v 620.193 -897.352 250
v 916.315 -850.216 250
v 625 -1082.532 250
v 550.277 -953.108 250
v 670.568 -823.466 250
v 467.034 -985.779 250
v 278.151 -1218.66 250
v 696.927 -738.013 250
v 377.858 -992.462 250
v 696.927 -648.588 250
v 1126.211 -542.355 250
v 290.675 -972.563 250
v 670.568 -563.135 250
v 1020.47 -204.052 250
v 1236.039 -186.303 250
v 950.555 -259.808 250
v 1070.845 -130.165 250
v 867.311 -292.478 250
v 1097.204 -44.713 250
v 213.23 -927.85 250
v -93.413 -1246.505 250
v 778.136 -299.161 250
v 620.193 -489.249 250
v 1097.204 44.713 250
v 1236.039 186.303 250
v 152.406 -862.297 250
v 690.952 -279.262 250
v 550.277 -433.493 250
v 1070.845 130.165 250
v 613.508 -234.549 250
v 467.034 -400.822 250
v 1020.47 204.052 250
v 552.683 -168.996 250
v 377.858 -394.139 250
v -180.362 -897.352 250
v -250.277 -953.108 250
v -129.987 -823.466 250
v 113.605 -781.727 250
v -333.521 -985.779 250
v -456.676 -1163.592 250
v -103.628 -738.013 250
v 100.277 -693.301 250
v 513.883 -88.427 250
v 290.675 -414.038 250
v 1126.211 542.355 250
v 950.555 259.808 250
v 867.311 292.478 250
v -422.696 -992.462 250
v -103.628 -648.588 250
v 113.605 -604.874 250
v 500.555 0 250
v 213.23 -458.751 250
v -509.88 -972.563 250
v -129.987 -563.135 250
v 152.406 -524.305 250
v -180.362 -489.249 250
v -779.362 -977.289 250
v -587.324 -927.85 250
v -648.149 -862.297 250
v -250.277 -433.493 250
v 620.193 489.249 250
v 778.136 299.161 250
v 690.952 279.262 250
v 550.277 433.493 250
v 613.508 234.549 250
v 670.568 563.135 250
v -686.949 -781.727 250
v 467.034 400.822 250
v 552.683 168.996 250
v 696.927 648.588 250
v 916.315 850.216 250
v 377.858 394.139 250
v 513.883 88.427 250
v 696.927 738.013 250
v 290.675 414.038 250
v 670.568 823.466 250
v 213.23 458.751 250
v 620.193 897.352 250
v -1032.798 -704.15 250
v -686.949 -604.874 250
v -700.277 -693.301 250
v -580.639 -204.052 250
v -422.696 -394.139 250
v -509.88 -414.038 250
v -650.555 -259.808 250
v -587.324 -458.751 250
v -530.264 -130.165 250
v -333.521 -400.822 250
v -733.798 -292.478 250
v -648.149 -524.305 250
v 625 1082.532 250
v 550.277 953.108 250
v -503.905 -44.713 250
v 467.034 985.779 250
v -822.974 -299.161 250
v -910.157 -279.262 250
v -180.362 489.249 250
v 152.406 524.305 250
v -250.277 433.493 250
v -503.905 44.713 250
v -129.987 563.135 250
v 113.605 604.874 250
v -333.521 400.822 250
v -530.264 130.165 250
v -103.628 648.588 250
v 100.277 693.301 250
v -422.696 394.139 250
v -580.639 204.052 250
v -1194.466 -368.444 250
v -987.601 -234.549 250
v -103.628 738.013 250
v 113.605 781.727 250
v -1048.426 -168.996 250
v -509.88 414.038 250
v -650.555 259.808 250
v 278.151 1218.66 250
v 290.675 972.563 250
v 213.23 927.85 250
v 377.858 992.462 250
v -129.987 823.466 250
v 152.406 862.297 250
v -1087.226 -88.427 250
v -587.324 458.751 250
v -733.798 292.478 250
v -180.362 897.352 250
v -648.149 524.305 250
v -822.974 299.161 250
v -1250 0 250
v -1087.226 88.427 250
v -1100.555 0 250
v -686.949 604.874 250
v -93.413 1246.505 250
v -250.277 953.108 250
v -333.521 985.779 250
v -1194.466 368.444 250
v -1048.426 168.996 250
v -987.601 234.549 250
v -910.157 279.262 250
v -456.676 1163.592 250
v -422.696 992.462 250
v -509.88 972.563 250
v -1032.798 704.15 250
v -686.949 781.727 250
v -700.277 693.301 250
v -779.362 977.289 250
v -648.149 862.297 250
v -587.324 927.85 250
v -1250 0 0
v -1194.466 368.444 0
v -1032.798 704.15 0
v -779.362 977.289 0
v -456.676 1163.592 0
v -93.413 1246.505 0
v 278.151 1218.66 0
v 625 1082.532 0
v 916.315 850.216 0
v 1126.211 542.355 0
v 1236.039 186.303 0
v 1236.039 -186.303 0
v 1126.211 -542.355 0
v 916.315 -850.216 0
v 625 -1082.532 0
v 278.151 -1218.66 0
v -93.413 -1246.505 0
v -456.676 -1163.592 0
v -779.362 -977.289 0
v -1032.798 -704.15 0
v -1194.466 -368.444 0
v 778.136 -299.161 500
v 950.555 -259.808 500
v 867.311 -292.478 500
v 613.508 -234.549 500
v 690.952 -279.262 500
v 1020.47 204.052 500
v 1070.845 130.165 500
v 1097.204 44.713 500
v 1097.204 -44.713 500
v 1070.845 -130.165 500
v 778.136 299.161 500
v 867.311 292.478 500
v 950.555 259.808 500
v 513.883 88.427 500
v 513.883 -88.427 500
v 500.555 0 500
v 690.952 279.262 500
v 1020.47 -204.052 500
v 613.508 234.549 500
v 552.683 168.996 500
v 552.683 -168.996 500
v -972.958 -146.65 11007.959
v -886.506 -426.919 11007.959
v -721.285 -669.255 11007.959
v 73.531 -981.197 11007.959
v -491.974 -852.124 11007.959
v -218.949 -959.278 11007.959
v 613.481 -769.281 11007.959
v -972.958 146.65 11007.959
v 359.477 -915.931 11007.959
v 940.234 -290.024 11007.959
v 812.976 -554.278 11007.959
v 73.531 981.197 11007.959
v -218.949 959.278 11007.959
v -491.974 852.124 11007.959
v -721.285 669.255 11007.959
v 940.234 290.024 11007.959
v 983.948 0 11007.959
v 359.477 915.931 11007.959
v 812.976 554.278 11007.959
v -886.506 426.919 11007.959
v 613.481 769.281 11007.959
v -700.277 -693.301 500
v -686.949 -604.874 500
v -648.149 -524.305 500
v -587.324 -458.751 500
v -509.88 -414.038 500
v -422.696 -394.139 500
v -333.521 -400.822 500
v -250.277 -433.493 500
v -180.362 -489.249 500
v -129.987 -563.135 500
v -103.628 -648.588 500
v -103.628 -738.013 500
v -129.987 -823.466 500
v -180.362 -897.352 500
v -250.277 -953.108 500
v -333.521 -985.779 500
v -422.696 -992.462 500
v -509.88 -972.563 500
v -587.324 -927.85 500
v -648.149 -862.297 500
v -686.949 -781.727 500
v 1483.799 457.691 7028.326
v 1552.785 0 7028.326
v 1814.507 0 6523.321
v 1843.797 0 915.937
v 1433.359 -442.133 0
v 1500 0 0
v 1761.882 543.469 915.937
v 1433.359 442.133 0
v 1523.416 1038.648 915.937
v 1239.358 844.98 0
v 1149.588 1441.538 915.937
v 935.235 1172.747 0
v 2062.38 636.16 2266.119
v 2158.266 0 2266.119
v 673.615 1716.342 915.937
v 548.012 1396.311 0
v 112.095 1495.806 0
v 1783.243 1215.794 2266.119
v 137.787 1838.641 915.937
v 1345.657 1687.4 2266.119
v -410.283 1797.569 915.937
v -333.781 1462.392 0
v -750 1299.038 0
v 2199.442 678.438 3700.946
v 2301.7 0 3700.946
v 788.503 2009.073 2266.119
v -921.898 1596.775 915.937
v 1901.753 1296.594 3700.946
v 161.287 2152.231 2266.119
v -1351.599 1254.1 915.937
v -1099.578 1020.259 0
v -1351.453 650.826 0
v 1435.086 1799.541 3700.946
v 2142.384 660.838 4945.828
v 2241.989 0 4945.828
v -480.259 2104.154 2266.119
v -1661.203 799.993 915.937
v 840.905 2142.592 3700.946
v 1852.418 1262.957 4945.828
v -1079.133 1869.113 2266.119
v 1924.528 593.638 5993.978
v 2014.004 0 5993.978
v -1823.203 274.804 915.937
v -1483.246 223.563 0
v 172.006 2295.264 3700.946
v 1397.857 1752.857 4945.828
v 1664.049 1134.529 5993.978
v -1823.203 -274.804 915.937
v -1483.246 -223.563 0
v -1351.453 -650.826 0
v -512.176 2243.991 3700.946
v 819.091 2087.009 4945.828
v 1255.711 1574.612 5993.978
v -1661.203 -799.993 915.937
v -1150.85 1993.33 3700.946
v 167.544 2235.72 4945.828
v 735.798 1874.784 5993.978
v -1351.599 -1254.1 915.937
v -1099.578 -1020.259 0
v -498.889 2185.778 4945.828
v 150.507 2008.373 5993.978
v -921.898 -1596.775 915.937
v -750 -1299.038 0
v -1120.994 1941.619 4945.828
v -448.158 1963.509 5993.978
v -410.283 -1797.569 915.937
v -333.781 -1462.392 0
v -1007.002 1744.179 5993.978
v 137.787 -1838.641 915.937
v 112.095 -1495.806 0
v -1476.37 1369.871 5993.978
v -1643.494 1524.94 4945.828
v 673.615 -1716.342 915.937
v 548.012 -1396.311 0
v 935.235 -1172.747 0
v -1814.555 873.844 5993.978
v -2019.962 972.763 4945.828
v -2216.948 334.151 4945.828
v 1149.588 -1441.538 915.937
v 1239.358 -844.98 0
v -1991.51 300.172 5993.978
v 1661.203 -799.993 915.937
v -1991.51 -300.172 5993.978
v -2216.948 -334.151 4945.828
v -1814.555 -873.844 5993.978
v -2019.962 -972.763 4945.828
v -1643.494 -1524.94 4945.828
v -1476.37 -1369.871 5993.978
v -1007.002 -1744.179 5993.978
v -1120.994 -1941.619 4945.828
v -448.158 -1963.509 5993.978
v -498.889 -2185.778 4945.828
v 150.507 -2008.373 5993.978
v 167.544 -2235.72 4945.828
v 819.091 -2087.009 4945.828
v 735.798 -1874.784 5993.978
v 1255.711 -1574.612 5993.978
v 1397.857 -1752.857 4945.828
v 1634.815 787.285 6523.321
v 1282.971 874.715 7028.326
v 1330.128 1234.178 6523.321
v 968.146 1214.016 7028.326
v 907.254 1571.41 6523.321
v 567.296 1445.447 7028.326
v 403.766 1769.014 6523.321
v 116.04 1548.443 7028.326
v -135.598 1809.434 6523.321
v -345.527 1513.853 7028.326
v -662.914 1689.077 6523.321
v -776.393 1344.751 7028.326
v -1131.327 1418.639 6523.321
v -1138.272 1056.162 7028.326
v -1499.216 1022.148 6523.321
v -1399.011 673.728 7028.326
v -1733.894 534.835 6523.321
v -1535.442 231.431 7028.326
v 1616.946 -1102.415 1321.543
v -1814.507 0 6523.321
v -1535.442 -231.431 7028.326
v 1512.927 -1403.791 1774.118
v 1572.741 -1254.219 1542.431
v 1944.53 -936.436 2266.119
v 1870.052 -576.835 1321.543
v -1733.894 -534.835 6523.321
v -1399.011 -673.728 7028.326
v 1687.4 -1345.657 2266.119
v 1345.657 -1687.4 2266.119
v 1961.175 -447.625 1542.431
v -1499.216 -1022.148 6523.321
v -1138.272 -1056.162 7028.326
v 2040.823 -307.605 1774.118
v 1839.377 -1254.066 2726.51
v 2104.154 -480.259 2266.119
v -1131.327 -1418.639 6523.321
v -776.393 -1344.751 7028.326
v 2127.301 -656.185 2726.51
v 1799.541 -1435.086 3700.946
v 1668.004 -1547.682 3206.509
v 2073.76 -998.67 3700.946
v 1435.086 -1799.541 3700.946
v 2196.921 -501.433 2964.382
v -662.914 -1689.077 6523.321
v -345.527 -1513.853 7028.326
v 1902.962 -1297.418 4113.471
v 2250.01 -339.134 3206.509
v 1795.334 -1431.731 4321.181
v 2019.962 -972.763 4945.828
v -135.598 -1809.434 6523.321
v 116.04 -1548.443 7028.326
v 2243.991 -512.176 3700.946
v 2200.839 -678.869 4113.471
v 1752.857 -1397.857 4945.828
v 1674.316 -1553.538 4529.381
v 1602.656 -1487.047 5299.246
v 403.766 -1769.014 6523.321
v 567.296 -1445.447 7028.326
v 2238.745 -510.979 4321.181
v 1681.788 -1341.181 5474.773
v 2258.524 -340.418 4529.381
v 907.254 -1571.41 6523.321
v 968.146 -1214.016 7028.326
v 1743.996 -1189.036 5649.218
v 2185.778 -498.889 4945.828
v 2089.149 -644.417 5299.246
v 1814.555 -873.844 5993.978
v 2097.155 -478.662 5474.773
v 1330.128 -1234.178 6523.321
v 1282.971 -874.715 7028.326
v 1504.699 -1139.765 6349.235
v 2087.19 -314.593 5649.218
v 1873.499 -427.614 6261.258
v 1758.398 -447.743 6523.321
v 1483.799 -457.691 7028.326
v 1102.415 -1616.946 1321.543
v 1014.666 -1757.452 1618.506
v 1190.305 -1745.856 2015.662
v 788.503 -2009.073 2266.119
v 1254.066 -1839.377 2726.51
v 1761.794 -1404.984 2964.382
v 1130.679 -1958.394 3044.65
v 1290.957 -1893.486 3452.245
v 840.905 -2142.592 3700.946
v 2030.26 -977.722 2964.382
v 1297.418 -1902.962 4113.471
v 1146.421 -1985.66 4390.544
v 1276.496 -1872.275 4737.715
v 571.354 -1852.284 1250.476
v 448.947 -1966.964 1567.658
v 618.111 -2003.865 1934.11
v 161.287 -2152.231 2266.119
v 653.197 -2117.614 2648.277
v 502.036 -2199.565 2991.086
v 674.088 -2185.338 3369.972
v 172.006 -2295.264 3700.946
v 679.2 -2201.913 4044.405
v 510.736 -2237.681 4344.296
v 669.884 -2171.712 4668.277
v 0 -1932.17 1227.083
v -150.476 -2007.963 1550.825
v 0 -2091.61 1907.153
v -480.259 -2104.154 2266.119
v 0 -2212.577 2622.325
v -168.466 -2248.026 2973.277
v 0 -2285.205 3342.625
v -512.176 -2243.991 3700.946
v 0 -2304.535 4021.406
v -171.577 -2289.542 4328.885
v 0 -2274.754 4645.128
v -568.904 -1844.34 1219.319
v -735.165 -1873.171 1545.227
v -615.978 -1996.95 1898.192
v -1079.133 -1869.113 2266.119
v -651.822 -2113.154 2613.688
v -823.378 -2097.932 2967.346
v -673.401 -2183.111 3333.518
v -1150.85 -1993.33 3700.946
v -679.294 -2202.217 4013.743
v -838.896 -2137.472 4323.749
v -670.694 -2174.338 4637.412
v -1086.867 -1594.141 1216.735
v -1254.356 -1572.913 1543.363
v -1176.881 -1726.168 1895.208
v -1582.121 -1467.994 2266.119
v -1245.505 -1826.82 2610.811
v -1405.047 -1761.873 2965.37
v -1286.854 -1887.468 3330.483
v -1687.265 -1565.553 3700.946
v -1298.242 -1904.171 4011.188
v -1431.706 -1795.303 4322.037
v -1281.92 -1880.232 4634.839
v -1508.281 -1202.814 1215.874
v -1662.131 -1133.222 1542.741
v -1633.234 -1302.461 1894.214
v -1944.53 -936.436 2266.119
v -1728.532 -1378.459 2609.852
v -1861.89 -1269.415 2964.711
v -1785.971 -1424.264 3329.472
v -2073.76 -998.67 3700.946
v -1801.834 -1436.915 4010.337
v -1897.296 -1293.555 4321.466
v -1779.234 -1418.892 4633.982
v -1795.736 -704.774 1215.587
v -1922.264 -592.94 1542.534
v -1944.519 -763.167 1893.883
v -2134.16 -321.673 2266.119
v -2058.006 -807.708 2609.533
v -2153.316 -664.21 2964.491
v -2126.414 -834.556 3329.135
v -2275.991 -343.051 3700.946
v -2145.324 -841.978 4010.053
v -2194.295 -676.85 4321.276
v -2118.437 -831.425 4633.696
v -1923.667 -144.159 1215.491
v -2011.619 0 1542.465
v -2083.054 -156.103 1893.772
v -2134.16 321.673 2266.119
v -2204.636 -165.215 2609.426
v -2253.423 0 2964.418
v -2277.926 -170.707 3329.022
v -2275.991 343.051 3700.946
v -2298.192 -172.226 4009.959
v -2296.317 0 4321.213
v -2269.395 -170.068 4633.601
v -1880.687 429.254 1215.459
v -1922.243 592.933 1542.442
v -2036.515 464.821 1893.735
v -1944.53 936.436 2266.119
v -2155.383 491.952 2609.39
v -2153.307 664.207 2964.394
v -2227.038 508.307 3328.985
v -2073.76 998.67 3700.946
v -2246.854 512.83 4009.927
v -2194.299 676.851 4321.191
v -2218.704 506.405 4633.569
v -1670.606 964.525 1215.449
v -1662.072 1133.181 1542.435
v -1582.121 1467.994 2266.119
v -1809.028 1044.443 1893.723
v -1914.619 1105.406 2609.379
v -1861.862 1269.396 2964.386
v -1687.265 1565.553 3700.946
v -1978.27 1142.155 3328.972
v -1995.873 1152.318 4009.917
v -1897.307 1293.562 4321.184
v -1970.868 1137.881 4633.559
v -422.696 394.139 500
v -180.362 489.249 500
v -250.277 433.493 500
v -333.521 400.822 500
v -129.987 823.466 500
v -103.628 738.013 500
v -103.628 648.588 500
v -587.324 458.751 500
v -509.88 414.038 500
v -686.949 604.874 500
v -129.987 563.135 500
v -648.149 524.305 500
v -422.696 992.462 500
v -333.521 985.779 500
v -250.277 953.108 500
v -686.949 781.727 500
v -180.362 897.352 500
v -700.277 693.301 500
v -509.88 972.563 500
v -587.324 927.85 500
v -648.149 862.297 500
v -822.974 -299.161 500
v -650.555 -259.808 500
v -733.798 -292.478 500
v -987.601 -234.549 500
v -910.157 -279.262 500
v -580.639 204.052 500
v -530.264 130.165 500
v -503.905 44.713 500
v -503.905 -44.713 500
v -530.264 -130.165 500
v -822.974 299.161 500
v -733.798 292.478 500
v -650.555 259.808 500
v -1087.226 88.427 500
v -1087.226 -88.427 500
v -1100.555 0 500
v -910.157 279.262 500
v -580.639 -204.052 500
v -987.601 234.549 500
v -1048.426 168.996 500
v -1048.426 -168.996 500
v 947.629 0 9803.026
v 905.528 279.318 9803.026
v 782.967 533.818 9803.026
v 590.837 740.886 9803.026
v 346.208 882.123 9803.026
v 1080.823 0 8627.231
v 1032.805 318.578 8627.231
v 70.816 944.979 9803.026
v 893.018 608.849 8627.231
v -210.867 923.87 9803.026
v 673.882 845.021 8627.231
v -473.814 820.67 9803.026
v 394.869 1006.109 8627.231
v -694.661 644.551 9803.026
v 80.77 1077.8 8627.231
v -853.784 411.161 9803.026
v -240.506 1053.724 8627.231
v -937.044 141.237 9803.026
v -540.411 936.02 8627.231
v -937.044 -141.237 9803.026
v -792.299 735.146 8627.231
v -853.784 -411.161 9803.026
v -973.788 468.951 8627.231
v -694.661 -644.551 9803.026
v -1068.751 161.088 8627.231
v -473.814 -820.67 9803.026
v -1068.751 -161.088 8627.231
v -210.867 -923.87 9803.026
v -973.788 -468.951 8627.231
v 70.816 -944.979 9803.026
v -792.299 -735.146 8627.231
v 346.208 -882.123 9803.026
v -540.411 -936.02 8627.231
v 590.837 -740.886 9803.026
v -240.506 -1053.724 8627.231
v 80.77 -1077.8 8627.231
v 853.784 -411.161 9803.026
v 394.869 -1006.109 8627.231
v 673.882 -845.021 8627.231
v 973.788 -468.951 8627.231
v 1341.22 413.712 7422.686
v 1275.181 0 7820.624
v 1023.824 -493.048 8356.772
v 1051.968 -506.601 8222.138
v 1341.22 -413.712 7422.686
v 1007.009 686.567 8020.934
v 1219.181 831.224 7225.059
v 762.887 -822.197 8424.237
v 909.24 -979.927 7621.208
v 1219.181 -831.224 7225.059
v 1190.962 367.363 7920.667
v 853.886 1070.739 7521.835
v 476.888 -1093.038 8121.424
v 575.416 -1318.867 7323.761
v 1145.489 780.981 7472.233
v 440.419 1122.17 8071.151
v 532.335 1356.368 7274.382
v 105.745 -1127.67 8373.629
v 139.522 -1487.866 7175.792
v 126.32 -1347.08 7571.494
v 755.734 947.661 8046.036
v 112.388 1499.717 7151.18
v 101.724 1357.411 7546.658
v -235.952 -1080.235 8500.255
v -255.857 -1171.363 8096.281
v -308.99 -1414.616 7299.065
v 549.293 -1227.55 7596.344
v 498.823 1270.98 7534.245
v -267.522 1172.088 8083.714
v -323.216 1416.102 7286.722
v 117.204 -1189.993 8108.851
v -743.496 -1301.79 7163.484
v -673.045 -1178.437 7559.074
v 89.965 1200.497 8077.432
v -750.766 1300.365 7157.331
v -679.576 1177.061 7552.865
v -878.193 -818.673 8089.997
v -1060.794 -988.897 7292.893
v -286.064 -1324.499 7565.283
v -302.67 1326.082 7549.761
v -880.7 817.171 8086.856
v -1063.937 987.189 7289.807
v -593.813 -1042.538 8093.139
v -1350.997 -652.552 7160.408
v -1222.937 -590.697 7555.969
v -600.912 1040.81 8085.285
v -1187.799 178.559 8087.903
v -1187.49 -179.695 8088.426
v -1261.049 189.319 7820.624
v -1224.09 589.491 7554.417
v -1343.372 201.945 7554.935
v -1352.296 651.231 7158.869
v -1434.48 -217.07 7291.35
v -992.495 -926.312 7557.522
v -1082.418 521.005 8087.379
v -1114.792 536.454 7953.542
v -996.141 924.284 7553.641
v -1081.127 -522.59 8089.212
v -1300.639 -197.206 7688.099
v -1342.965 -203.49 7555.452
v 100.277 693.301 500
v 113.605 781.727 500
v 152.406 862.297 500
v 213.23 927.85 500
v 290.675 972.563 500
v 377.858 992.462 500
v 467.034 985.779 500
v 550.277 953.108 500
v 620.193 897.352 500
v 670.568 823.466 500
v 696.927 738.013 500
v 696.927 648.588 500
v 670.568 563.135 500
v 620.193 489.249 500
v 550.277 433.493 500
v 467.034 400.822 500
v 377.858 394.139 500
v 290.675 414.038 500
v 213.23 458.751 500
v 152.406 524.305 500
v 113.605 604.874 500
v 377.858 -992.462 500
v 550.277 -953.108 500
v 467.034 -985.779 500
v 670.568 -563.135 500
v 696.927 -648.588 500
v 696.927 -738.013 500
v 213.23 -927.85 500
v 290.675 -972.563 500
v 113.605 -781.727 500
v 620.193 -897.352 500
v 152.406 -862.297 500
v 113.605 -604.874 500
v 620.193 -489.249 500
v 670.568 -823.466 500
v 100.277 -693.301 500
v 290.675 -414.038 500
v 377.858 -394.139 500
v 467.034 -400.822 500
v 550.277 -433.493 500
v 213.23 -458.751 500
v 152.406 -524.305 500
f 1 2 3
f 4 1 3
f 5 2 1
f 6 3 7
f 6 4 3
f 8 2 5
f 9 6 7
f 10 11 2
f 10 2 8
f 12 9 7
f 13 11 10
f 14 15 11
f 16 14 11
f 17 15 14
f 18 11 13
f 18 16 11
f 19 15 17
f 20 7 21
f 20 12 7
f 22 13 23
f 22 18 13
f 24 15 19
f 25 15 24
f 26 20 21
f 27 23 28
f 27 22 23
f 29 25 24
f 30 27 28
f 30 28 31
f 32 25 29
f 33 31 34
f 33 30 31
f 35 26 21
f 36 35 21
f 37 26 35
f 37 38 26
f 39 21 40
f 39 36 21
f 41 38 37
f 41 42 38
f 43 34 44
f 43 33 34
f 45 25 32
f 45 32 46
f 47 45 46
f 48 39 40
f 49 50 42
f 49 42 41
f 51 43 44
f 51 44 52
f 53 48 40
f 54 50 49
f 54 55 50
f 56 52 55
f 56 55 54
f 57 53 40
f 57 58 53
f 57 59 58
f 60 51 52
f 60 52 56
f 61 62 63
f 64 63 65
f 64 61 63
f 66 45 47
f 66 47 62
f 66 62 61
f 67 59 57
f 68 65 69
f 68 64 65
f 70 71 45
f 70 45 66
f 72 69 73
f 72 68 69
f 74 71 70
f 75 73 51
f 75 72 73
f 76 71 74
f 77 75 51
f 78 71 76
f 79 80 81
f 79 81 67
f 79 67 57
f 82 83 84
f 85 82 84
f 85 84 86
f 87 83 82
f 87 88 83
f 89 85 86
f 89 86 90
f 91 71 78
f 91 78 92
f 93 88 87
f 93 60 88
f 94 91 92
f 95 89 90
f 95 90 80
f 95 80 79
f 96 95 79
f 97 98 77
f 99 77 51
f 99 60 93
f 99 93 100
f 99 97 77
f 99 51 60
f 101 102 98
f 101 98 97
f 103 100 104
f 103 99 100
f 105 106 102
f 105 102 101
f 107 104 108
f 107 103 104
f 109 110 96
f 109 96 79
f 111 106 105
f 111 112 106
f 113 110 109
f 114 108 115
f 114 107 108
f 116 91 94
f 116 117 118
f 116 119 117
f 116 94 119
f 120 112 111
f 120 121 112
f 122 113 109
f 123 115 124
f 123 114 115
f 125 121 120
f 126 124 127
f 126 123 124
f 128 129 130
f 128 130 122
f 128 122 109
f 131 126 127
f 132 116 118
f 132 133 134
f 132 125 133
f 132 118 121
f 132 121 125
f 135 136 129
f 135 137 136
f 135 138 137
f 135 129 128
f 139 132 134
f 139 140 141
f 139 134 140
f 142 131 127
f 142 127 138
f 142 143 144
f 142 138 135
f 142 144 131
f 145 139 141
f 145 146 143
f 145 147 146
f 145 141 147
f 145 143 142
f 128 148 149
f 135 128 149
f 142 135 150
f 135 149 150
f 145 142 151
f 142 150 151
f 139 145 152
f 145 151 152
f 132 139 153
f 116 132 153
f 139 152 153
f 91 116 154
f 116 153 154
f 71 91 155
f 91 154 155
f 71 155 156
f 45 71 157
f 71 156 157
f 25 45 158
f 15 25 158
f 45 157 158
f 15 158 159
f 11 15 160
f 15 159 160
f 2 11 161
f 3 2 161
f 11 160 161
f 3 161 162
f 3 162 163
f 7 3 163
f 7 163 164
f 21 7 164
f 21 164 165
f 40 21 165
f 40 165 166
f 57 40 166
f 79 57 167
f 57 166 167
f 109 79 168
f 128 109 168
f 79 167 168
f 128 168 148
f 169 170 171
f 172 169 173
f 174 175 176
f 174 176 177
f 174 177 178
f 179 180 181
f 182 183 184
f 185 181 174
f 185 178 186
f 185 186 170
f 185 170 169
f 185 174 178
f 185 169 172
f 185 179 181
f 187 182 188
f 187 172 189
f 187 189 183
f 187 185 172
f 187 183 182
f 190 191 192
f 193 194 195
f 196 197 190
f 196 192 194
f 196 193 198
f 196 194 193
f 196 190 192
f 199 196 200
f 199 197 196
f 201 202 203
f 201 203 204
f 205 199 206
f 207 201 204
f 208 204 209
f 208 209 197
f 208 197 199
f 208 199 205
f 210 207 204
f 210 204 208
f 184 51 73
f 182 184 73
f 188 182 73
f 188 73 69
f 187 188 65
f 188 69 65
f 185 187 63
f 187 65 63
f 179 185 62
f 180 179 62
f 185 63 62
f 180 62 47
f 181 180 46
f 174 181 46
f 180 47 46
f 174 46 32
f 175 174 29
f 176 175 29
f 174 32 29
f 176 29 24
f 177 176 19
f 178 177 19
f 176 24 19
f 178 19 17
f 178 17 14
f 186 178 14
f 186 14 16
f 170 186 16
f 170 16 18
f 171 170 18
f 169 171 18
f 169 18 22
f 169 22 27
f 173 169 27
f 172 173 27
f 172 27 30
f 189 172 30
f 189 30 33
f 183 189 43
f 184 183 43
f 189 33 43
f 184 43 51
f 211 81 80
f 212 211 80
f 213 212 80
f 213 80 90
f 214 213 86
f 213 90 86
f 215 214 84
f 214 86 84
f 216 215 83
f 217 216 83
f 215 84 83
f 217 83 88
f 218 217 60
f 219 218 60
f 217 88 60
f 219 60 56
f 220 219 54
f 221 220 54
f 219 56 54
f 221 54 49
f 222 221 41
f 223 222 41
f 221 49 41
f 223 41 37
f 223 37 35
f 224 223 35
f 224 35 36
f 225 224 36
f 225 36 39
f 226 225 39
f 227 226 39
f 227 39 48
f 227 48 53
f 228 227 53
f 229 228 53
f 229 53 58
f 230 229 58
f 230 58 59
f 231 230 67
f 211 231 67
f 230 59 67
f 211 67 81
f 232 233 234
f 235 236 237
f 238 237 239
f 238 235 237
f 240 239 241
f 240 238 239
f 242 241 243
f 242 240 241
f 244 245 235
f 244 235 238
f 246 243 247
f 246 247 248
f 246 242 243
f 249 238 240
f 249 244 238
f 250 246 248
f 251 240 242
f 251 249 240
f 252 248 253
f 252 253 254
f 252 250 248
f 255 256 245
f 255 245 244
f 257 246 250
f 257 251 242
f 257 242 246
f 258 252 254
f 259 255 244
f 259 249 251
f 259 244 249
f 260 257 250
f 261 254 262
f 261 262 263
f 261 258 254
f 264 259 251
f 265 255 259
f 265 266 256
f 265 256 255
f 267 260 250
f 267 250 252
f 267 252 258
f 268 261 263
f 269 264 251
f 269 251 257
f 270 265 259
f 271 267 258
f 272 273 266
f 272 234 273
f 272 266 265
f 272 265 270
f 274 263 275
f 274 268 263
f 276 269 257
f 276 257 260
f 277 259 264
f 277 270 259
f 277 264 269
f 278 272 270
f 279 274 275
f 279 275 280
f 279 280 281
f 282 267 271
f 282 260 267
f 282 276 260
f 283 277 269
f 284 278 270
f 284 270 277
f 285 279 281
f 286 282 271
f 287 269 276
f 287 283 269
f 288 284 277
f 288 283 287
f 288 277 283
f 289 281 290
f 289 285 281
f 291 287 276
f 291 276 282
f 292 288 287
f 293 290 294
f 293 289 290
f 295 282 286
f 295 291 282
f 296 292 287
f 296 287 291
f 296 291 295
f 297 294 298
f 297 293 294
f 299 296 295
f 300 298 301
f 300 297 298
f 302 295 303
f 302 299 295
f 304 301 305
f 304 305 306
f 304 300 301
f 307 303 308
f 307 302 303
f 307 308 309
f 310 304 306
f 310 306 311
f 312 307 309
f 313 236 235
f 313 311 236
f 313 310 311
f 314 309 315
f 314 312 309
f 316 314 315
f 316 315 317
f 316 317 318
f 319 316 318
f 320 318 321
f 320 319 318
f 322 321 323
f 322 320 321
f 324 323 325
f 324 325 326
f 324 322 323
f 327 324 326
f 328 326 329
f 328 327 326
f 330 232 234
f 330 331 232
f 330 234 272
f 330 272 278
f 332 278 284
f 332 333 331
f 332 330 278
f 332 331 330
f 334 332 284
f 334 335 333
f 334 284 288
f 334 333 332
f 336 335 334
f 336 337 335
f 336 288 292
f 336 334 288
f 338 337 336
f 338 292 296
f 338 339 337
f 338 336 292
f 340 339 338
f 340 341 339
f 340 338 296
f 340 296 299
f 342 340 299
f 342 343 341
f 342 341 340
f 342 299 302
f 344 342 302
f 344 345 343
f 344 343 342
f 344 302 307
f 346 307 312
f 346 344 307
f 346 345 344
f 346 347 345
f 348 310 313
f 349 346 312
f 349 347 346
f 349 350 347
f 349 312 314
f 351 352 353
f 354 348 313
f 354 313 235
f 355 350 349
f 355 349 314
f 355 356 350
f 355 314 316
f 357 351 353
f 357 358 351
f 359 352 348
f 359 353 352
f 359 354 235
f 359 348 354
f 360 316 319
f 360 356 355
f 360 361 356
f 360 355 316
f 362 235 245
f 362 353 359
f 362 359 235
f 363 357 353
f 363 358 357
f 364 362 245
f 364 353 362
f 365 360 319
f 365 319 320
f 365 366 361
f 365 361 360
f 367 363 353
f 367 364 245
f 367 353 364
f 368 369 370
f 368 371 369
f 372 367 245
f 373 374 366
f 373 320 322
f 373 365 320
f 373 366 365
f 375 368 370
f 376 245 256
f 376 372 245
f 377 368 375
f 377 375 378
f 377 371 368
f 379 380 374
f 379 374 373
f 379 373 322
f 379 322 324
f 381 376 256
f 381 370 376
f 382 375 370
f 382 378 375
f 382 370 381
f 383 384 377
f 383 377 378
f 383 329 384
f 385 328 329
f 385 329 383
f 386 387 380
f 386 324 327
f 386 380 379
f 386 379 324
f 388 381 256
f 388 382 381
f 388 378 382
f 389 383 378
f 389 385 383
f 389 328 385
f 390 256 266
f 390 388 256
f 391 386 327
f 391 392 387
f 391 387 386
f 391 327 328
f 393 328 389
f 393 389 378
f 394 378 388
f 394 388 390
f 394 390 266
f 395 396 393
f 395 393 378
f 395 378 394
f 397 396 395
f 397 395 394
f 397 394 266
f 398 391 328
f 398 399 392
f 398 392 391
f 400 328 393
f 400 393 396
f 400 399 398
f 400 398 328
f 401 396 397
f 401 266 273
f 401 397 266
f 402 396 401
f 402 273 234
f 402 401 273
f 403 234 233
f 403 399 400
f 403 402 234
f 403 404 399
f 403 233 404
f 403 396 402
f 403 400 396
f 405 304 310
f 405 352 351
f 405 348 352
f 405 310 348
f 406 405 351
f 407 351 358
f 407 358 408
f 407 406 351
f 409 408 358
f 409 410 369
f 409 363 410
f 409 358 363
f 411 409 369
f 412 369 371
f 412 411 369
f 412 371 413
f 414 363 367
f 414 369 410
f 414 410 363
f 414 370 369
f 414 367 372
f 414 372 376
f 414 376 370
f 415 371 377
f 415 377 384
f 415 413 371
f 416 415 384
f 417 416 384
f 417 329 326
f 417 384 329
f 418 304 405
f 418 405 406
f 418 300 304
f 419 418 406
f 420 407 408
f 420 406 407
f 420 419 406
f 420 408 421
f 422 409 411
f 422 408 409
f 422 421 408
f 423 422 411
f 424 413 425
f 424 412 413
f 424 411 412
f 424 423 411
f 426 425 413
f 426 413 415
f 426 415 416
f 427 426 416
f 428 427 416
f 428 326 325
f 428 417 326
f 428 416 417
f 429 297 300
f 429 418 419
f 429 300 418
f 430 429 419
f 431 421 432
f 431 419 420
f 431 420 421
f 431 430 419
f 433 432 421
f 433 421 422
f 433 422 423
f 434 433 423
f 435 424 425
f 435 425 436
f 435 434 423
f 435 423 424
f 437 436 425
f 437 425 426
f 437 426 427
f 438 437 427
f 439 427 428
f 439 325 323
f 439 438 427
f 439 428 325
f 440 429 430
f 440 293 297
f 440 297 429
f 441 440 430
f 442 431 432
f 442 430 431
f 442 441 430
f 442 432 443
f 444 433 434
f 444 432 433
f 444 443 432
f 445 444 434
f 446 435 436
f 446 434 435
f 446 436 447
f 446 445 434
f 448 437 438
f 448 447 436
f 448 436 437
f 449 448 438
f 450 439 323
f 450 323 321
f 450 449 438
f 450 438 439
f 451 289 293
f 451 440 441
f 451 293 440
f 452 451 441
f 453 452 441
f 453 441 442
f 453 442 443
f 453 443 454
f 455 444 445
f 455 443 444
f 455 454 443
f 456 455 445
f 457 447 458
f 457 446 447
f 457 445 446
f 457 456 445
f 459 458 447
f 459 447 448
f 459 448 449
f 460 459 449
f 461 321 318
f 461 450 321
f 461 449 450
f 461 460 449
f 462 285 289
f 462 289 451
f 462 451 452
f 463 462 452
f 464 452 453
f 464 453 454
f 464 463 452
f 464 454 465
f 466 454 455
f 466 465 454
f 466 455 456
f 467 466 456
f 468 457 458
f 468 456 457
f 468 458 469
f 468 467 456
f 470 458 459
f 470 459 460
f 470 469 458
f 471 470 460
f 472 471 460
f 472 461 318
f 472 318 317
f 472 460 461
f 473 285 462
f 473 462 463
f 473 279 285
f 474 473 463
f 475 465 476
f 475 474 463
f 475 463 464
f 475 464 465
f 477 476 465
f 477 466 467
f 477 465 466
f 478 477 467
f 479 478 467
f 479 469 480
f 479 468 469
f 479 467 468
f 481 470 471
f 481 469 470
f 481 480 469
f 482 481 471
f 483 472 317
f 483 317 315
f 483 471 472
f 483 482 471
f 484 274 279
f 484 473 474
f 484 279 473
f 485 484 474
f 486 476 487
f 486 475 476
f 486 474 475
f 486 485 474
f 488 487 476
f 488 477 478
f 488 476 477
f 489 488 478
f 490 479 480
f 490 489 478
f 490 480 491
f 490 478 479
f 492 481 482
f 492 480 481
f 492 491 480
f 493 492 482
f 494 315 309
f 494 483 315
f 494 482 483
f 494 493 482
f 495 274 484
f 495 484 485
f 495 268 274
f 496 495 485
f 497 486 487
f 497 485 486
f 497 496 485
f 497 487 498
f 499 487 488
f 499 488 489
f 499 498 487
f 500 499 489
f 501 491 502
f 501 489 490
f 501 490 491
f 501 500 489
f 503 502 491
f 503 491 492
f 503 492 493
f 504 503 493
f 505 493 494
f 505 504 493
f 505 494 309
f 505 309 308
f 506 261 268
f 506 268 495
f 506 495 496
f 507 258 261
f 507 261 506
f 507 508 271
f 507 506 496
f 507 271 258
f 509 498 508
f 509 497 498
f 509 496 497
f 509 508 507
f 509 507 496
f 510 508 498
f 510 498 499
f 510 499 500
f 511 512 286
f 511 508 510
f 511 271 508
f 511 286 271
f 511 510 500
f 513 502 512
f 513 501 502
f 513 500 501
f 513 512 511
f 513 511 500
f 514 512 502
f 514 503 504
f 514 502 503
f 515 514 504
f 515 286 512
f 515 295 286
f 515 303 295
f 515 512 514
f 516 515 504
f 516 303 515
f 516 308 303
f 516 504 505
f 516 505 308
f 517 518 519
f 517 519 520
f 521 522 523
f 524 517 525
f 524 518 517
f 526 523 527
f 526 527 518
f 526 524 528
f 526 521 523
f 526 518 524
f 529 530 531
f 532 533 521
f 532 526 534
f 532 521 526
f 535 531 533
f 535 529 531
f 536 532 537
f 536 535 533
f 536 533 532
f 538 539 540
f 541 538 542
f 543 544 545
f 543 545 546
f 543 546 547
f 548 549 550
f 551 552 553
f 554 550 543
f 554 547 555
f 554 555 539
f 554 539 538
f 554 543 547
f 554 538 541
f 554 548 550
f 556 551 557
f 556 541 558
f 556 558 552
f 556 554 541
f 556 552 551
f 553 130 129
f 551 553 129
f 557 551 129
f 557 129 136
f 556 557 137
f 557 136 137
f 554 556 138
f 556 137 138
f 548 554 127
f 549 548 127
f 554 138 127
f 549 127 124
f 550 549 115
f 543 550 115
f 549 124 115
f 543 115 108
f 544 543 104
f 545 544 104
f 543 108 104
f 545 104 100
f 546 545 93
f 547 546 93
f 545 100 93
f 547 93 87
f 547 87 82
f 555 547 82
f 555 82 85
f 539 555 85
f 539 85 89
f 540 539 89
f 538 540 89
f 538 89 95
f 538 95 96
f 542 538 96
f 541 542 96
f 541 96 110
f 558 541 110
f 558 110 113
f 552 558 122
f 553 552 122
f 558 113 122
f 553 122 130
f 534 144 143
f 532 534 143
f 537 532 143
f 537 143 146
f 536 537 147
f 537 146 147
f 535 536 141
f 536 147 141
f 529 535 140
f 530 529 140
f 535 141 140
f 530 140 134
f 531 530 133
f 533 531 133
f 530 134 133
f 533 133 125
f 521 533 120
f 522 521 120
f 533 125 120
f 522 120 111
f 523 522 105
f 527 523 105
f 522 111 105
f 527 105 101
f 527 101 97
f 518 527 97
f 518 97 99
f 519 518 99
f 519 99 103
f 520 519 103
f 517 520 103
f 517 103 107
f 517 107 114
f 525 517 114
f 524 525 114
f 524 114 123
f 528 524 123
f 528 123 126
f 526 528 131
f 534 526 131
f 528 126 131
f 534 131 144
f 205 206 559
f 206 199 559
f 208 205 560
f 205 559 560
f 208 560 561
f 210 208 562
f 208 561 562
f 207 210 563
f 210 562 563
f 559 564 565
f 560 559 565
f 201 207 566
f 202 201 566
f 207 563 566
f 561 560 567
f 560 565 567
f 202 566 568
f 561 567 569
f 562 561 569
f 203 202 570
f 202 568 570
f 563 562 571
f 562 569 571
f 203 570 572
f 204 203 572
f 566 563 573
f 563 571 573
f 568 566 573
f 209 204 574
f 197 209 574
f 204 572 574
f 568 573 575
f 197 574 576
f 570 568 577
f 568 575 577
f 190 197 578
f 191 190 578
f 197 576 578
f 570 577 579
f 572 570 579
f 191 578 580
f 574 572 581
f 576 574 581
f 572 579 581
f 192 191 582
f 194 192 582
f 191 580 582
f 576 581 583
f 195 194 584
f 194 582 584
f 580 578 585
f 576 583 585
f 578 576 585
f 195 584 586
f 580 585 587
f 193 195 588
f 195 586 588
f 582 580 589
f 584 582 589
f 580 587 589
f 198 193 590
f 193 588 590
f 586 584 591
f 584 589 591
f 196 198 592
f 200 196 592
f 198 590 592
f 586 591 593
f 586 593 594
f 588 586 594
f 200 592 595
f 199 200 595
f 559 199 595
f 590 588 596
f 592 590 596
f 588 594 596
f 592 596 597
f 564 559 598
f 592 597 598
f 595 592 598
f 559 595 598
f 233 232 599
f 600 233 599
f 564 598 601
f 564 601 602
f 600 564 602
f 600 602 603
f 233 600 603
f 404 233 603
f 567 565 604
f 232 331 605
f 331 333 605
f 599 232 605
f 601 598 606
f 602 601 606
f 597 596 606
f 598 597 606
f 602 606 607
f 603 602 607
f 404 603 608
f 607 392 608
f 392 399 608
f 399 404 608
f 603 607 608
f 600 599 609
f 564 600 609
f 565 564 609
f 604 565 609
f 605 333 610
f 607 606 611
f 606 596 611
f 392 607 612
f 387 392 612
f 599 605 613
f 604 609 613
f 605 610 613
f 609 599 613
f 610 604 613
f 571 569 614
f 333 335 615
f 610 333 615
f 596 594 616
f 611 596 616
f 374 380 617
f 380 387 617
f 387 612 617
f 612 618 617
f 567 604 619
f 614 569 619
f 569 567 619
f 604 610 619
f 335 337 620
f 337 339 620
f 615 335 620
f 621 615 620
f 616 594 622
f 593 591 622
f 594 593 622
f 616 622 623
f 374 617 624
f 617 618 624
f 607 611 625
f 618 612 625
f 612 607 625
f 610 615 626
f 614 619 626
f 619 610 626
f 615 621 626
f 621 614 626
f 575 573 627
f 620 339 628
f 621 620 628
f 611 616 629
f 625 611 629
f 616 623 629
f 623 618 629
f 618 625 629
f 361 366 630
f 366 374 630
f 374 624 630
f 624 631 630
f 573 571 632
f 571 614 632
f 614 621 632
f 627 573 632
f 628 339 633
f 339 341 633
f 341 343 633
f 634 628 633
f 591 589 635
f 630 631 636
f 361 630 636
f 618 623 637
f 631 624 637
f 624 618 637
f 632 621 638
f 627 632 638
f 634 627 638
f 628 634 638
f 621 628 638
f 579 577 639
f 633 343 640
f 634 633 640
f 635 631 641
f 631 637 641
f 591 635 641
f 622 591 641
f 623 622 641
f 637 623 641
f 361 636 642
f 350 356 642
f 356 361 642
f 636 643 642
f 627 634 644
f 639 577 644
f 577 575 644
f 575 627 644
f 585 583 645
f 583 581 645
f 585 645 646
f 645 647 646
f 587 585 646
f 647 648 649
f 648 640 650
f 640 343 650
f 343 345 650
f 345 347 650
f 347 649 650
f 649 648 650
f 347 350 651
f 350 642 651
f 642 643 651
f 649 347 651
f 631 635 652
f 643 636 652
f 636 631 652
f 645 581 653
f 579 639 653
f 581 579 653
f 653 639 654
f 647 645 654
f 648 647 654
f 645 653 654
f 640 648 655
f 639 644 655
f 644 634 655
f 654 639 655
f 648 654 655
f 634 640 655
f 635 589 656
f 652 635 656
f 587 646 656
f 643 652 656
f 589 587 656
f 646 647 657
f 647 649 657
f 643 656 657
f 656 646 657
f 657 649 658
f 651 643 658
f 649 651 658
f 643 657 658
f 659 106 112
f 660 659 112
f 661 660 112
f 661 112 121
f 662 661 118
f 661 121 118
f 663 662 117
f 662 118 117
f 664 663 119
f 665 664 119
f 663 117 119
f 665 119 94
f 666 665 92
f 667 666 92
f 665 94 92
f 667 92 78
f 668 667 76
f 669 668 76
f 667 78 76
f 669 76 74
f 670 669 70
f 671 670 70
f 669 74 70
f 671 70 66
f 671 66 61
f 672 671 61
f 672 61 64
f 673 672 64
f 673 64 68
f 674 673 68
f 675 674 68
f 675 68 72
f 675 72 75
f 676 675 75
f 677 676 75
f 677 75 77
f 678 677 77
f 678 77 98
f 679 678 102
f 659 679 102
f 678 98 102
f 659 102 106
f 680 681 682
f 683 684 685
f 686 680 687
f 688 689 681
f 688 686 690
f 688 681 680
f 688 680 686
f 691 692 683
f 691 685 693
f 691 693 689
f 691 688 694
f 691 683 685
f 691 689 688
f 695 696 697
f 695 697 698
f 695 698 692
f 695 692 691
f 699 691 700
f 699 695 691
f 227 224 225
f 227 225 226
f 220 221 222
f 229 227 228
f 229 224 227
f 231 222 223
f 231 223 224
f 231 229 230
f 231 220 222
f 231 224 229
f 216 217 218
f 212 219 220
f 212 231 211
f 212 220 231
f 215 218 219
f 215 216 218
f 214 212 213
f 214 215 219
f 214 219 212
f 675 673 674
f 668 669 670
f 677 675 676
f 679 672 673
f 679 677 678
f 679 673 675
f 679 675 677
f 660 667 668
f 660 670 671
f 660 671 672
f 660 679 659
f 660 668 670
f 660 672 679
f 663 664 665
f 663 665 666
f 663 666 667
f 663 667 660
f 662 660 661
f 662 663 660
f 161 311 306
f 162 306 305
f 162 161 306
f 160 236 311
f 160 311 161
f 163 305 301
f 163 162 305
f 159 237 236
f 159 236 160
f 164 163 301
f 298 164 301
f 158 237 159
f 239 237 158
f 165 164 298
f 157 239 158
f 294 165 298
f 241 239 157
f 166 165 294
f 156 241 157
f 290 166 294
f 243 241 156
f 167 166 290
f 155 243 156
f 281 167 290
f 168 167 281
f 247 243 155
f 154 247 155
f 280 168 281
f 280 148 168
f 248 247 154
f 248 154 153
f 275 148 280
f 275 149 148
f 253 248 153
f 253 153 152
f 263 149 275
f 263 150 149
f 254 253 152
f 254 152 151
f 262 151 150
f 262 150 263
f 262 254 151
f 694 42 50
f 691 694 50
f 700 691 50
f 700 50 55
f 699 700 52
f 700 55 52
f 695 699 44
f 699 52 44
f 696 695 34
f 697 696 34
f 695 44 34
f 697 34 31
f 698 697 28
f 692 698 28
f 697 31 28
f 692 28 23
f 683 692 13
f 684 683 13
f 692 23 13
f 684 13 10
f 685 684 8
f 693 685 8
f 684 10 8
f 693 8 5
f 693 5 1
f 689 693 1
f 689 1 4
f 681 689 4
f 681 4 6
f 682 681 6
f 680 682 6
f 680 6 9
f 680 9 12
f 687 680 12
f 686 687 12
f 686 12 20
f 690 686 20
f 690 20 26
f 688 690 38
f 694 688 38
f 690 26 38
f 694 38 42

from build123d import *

# Parameters (mm, degrees)
SKETCH5_R          = 1250
CUT_EXTRUDE2_DEPTH = 250
SKETCH8_R          = 300
CUT_EXTRUDE5_DEPTH = 250


with BuildPart() as part:
    # Sketch2 → Revolve4 (revolve)
    with BuildSketch(Plane(origin=(0, 0, 0), x_dir=(1, 0, 0), z_dir=(0, 1, 0))):
        with BuildLine():
            Line((983.947861403, -11007.958646251), (0, -11007.958646251))
            Line((0, -11007.958646251), (0, 0))
            Line((0, 0), (1500, 0))
            add(Edge.make_bspline(
                [(1500, 0), (1901.182531153, -776.853983433), (3061.461672261, -4517.414953739), (1552.785010708, -7028.326321897)],
                knots=[0, 0, 0, 0, 1, 1, 1, 1], degree=3))
            add(Edge.make_bspline(
                [(983.947861403, -11007.958646251), (778.02463544, -8933.856534366), (1552.785010708, -7028.326321897)],
                knots=[0, 0, 0, 1, 1, 1], degree=2))
        make_face()
    revolve(axis=Axis((0, 0, 0), (0, 0, 1)))

    # Sketch5 → Cut-Extrude2 (cut)
    with BuildSketch(Plane(origin=(0, 0, 0), x_dir=(-1, 0, 0), z_dir=(0, 0, -1))):
        Circle(SKETCH5_R)
    extrude(amount=-CUT_EXTRUDE2_DEPTH, mode=Mode.SUBTRACT)

    # Sketch8 → Cut-Extrude5 (cut)
    with BuildSketch(Plane(origin=(0, 0, 250), x_dir=(-1, 0, 0), z_dir=(0, 0, -1))):
        with Locations((800.554534759, 0)):
            Circle(SKETCH8_R)
        with Locations((400.27726738, -693.300564216)):
            Circle(SKETCH8_R)
        with Locations((-400.27726738, -693.300564216)):
            Circle(SKETCH8_R)
        with Locations((-800.554534759, 0)):
            Circle(SKETCH8_R)
        with Locations((-400.27726738, 693.300564216)):
            Circle(SKETCH8_R)
        with Locations((400.27726738, 693.300564216)):
            Circle(SKETCH8_R)
    extrude(amount=-CUT_EXTRUDE5_DEPTH, mode=Mode.SUBTRACT)


solid = part.part
